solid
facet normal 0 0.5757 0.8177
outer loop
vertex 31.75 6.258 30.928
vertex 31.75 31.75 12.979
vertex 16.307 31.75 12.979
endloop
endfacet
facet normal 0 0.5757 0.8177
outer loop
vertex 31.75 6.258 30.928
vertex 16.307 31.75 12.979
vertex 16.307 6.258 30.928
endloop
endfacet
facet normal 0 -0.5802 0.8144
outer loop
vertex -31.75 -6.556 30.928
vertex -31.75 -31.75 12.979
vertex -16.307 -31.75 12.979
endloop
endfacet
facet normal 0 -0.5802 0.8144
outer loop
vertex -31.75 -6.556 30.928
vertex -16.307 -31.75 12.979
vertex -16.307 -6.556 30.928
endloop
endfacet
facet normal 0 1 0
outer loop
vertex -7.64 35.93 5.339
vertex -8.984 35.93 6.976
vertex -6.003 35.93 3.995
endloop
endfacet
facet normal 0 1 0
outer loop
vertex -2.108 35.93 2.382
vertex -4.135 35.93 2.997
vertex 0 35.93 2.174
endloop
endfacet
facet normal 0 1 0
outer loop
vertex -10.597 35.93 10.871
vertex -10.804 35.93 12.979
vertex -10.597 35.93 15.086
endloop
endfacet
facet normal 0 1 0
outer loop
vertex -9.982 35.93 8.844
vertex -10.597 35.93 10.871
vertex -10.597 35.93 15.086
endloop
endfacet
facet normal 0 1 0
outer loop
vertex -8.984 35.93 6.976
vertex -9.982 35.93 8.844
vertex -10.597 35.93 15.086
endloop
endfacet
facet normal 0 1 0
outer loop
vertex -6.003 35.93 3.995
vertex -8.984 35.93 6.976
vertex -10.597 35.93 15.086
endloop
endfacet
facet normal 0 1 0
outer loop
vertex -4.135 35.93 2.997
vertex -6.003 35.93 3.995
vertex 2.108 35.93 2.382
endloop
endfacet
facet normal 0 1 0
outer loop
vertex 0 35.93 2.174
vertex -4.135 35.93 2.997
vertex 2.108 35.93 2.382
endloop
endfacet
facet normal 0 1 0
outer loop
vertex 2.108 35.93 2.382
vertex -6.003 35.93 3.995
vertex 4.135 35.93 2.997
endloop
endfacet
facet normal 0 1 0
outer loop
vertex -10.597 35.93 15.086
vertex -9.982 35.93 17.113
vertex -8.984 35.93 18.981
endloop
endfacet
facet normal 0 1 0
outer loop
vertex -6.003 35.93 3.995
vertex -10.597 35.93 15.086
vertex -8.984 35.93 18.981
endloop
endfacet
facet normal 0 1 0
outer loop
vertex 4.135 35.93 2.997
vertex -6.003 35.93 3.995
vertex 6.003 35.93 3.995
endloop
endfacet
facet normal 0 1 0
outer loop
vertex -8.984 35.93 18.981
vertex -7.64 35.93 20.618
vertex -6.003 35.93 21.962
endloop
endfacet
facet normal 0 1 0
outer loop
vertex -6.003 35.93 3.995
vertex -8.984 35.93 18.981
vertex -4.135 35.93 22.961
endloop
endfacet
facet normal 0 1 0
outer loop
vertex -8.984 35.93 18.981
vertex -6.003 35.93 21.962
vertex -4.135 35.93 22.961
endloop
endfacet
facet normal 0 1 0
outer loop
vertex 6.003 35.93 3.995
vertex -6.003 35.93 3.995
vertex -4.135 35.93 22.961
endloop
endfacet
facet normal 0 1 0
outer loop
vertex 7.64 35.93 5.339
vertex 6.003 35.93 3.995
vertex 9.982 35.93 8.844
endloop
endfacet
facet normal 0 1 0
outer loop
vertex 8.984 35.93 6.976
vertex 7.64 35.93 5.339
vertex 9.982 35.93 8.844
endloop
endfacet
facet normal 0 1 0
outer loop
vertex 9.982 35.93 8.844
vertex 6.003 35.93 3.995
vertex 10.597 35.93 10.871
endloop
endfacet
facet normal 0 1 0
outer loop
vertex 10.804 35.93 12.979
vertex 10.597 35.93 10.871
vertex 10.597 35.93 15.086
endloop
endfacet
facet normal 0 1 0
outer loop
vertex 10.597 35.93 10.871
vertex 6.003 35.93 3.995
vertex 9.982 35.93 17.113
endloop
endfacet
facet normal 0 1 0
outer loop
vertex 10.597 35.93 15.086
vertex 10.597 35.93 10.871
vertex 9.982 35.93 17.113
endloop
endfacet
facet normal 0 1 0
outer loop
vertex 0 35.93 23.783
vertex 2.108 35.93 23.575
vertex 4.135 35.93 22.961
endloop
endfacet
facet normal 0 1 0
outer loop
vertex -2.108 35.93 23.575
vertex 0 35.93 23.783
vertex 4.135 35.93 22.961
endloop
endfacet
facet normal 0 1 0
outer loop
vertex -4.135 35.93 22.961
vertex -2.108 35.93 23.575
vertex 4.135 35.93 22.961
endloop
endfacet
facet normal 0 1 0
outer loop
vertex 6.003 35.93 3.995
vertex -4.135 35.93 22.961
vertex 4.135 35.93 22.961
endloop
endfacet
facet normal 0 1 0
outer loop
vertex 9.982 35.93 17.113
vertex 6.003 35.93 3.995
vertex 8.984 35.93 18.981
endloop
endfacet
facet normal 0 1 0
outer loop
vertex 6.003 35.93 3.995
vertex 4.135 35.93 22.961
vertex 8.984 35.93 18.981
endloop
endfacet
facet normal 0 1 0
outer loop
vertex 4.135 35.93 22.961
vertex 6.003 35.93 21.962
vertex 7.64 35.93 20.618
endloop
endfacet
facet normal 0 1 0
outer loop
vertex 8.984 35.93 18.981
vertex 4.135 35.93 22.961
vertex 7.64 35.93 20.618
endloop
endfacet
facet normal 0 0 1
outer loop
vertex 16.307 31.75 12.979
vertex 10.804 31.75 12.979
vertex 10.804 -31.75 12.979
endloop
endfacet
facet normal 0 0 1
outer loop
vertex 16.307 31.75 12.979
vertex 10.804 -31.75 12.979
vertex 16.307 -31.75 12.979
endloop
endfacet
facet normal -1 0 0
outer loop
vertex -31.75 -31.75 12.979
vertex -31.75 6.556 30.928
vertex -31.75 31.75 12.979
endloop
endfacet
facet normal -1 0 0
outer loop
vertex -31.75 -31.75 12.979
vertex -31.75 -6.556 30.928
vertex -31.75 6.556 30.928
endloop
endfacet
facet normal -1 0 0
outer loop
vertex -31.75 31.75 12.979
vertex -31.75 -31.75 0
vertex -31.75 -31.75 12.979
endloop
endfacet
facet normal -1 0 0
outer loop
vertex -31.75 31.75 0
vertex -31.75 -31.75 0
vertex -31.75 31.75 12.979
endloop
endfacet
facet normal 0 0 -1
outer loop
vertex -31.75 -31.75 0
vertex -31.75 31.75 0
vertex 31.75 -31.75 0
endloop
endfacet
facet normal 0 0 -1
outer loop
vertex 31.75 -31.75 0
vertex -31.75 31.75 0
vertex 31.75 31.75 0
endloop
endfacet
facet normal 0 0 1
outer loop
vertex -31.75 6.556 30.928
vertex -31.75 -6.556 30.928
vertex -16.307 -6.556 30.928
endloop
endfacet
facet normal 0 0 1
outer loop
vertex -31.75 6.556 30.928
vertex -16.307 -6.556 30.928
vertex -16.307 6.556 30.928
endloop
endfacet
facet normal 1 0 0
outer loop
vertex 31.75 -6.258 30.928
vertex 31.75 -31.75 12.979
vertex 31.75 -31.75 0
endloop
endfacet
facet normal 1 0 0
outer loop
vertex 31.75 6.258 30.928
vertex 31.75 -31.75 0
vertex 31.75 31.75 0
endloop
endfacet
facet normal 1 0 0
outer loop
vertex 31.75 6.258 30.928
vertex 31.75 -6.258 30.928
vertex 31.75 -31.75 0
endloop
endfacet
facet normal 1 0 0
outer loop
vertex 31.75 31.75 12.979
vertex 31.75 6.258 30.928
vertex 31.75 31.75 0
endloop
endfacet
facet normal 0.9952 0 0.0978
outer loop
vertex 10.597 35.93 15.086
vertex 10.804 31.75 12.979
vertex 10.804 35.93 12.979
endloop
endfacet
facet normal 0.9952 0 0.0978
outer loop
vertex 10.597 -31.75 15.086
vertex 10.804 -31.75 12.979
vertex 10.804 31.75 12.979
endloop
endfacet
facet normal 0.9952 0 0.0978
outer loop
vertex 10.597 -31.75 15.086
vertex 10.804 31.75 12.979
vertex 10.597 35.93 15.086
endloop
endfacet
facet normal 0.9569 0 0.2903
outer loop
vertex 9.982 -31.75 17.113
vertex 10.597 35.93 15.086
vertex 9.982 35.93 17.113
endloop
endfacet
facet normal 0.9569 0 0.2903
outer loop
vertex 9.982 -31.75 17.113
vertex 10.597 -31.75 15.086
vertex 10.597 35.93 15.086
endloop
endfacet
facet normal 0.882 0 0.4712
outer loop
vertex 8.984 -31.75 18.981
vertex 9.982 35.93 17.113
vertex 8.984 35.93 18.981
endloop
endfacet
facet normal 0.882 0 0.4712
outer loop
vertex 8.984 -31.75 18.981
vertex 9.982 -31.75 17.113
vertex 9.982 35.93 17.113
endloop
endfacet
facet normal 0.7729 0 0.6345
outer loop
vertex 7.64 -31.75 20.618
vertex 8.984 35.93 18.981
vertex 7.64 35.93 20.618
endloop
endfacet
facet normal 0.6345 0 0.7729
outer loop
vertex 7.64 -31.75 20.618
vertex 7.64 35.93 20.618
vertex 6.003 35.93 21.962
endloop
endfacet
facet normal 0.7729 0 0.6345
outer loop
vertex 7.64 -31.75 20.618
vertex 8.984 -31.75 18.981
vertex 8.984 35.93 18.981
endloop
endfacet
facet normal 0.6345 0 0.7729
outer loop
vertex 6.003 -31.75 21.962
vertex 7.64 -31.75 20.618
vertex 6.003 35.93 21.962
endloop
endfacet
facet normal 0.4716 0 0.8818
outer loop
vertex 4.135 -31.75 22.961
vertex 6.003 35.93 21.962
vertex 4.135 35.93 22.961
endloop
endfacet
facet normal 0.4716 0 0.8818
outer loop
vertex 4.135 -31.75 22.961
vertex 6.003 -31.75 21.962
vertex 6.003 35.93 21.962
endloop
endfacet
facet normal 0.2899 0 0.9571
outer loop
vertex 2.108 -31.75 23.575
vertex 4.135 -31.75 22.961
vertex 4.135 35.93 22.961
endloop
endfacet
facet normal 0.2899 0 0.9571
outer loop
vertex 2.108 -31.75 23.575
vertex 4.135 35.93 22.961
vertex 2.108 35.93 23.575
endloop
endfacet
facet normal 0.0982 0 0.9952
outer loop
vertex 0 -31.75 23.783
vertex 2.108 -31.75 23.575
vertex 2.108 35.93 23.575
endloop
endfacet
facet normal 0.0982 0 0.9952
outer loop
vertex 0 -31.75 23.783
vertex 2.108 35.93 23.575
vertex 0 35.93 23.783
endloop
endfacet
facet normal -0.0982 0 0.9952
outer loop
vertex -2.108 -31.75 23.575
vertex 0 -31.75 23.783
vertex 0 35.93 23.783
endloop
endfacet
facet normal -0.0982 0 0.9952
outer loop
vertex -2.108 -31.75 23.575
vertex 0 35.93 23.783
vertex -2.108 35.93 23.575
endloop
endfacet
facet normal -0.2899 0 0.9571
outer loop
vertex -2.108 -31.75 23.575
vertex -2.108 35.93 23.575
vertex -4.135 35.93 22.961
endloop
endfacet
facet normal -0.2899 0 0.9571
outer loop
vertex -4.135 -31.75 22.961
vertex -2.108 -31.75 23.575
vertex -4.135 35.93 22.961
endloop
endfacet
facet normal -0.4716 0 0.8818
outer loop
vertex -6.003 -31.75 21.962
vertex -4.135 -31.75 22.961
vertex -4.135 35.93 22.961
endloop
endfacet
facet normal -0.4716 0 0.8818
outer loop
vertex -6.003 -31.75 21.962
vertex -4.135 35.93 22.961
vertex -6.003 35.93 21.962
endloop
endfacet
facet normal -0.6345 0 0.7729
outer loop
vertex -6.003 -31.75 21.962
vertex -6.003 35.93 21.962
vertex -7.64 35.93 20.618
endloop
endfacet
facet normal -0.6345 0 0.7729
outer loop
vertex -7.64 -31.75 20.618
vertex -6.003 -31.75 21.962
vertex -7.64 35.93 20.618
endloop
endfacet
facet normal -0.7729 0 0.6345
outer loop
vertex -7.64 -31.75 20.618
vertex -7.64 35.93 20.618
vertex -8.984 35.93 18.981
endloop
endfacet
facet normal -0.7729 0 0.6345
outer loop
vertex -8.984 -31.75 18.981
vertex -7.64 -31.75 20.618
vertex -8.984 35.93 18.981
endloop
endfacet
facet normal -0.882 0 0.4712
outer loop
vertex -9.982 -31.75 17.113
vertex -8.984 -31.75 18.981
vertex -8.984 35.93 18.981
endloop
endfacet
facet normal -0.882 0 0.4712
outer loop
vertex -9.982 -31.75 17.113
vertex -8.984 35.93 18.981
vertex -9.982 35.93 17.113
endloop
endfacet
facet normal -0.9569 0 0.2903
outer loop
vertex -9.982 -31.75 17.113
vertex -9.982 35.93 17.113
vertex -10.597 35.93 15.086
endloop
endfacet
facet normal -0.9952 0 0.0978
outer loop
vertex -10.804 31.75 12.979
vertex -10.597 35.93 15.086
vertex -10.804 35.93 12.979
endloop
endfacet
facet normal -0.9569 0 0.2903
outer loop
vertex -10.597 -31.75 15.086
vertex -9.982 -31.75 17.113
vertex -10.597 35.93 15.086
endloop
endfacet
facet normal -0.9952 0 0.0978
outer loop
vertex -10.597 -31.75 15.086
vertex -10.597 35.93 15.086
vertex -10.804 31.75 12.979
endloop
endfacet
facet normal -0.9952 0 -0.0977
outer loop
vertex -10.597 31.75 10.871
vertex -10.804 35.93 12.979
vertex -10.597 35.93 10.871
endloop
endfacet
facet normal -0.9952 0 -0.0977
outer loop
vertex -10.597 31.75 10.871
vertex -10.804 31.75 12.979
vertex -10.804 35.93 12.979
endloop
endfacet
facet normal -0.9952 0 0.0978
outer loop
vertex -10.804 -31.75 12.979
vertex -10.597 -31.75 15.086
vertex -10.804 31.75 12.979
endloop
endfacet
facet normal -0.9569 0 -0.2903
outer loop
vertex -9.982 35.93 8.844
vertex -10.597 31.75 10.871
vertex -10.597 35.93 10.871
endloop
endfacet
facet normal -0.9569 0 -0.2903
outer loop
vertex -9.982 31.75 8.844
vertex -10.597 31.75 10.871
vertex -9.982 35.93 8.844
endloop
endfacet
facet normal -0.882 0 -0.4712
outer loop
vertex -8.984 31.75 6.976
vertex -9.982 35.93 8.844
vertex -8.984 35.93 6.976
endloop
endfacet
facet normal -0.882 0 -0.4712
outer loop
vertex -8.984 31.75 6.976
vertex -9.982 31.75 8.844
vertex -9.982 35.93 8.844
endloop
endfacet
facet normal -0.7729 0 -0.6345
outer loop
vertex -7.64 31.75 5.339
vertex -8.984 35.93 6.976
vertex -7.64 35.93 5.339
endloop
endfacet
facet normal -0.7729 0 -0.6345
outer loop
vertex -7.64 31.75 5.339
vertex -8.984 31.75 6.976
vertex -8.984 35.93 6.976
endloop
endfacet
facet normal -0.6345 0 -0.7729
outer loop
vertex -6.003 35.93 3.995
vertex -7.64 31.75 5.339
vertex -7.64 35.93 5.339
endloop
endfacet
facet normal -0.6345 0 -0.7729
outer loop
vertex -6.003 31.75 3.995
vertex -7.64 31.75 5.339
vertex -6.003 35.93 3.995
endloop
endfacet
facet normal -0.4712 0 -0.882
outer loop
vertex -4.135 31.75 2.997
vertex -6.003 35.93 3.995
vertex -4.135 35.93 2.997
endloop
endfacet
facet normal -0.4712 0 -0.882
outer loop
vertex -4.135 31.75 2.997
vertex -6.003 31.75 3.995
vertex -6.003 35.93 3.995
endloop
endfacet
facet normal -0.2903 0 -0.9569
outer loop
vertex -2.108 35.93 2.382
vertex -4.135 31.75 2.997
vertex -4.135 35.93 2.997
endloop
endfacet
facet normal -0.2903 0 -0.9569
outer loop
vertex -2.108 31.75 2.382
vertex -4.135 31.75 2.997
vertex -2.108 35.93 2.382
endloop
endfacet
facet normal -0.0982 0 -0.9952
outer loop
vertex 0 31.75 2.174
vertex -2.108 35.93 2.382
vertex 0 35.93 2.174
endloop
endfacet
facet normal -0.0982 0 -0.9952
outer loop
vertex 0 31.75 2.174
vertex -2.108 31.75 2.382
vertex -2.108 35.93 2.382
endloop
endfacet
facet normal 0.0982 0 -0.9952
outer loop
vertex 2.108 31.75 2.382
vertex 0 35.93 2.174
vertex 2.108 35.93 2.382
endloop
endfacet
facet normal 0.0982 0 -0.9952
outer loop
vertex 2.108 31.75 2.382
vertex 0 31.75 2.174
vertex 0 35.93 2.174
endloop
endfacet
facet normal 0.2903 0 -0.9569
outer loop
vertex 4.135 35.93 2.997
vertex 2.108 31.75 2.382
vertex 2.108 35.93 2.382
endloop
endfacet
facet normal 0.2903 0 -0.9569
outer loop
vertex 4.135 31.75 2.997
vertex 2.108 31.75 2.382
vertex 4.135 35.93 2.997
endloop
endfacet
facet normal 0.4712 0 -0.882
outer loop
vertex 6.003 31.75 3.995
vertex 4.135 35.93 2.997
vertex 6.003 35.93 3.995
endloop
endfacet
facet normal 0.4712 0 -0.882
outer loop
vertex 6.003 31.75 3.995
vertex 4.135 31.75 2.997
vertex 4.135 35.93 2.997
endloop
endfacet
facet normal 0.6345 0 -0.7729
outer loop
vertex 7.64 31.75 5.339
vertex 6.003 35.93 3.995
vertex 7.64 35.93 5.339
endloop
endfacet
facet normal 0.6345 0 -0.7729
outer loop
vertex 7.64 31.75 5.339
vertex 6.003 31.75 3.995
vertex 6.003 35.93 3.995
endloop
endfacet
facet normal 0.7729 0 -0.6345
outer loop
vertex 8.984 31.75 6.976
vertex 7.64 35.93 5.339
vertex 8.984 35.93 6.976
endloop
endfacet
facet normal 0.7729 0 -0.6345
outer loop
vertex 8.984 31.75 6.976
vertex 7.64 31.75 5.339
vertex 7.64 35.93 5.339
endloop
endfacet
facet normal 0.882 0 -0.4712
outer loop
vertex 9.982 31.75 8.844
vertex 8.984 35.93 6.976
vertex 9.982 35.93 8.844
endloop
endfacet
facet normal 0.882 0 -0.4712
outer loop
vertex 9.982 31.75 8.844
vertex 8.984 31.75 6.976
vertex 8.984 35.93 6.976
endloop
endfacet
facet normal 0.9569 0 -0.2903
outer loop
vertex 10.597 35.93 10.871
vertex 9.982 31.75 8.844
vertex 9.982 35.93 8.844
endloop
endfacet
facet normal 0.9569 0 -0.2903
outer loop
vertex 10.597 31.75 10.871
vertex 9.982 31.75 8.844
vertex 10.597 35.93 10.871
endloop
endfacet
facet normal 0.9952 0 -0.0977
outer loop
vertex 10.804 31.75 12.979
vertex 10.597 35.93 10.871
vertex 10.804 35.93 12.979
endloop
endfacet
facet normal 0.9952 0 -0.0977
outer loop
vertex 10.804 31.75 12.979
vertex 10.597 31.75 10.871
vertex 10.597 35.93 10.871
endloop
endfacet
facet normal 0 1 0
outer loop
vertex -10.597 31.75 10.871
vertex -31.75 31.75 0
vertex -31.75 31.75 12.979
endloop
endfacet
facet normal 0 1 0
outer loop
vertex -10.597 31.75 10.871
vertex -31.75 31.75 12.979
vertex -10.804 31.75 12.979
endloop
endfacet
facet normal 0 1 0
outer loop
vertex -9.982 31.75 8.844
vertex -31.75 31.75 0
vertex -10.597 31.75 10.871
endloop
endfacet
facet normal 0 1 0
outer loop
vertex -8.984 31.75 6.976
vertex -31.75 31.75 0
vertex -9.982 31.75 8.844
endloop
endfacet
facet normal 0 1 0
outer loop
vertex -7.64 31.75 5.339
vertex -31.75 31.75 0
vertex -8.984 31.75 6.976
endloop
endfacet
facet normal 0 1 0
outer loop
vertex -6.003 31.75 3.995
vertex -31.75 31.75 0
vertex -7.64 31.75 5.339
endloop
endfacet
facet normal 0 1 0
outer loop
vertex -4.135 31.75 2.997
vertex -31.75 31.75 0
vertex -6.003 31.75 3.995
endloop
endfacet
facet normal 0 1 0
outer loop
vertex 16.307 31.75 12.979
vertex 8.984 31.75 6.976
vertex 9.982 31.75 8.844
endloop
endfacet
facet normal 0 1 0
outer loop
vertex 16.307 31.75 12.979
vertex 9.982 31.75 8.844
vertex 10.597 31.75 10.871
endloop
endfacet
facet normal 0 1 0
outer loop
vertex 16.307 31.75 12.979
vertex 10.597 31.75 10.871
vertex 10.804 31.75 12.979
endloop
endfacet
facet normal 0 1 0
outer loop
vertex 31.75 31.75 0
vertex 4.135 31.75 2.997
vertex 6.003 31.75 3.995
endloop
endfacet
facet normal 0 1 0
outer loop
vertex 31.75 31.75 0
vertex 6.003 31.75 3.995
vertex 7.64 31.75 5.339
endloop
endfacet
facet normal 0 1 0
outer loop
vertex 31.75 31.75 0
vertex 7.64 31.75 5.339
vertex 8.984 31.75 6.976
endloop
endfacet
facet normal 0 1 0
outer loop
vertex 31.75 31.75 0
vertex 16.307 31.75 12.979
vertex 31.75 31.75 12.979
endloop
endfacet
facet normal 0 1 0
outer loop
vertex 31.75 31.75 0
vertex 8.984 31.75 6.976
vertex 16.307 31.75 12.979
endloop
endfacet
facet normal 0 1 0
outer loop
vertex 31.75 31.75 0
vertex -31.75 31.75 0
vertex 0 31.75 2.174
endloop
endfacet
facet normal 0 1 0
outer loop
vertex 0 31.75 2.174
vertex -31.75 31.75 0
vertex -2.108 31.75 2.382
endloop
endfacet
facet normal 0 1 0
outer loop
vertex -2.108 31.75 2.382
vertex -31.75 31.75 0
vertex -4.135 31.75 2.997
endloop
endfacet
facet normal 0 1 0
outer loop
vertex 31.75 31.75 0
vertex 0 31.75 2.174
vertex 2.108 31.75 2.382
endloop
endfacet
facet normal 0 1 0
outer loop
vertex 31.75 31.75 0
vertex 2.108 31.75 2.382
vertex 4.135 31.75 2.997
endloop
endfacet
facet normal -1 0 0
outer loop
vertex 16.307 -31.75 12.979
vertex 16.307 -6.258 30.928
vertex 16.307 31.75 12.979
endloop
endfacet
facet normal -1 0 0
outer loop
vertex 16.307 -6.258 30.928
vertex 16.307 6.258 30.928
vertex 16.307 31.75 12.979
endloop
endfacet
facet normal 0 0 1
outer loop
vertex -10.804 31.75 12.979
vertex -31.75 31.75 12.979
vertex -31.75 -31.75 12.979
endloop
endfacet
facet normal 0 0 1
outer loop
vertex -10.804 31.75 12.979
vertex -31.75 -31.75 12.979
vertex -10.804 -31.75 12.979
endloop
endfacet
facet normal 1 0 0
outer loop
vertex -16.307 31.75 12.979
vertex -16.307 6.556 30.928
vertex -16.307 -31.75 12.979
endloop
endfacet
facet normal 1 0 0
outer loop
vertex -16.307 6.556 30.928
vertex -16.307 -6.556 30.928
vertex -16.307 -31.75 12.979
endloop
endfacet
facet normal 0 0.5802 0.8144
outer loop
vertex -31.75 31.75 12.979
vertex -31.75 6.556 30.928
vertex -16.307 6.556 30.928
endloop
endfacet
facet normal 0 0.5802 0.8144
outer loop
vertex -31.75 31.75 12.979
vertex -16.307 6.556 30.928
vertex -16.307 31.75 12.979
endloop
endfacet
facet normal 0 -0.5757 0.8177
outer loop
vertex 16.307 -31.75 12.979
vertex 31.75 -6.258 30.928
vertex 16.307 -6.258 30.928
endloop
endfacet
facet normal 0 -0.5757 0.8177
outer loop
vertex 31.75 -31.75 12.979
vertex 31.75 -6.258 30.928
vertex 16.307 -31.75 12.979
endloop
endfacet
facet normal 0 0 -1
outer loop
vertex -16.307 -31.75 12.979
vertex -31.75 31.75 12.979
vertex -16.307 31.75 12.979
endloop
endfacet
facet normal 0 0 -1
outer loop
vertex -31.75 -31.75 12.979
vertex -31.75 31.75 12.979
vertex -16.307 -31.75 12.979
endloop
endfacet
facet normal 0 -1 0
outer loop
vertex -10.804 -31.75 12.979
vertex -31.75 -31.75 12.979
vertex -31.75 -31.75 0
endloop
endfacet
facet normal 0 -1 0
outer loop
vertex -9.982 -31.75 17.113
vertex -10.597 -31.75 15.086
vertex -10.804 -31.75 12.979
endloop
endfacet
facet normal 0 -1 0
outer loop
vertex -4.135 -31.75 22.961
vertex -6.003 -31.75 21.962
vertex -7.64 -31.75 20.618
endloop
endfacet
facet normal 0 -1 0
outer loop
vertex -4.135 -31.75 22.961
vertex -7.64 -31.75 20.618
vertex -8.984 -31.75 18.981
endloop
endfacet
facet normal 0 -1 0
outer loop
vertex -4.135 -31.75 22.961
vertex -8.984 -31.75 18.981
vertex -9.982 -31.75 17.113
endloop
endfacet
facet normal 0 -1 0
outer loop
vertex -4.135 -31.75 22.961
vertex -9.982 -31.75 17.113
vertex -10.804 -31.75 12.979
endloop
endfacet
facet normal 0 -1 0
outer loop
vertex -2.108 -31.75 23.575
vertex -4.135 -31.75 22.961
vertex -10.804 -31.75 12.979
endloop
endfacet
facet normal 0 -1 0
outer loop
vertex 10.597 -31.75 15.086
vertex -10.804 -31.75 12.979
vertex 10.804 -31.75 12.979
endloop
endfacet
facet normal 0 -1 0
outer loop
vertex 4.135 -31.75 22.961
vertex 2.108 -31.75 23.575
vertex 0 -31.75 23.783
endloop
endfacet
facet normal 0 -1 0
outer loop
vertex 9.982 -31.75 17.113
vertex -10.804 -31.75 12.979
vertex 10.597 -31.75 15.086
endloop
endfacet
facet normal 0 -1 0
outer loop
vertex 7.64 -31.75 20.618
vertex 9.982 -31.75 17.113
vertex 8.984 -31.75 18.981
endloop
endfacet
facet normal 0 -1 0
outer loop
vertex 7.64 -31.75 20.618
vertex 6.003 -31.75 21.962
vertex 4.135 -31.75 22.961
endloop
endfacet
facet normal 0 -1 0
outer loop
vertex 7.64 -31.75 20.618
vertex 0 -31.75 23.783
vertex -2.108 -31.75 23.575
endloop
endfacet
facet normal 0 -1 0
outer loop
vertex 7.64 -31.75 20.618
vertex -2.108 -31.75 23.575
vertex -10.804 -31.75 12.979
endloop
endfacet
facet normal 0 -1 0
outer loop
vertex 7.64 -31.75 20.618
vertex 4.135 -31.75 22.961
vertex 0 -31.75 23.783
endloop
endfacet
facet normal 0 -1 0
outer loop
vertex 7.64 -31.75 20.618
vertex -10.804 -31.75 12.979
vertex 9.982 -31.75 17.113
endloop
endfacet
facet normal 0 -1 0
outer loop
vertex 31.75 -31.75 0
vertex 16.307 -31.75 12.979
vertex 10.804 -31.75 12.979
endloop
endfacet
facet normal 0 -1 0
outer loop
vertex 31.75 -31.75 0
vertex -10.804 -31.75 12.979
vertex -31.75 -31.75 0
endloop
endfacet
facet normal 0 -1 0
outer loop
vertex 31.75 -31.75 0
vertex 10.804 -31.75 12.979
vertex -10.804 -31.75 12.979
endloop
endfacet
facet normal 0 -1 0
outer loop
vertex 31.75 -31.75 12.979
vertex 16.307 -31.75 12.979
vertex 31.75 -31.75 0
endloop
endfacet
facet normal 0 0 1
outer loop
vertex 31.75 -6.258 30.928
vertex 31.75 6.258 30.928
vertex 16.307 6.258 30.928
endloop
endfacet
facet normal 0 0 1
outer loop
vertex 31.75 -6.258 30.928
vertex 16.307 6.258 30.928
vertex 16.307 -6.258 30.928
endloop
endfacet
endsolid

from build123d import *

# Parameters (mm, degrees)
F0_W     = 63.5
F0_H     = 63.5
F1_DEPTH = 12.97857
F3_DEPTH = 15.4432
F5_DEPTH = 15.4432
F6_R     = 10.804418
F7_DEPTH = 67.67966


with BuildPart() as f1:
    # F0 (on Top) → F1 (new body)
    with BuildSketch(Plane.XY):
        Rectangle(F0_W, F0_H)
    extrude(amount=F1_DEPTH)

    # F4 (on face) → F5 (join)
    with BuildSketch(Plane.YZ.offset(31.75)):
        Polygon((-6.257765, 30.928377), (-31.75, 12.97857), (31.75, 12.97857), (6.257765, 30.928377), align=None)
    extrude(amount=-F5_DEPTH)

    # F6 (on face) → F7 (join)
    with BuildSketch(Plane.XZ.offset(31.75)):
        with Locations((0, 12.97857)):
            Circle(F6_R)
    extrude(amount=-F7_DEPTH)


with BuildPart() as f3:
    # F2 (on face) → F3 (new body)
    with BuildSketch(Plane(origin=(-31.75, 0, 0), x_dir=(0, -1, 0), z_dir=(-1, 0, 0))):
        Polygon((-6.555754, 30.928377), (-31.75, 12.97857), (31.75, 12.97857), (6.555754, 30.928377), align=None)
    extrude(amount=-F3_DEPTH)


solid = Compound([f1.part, f3.part])
